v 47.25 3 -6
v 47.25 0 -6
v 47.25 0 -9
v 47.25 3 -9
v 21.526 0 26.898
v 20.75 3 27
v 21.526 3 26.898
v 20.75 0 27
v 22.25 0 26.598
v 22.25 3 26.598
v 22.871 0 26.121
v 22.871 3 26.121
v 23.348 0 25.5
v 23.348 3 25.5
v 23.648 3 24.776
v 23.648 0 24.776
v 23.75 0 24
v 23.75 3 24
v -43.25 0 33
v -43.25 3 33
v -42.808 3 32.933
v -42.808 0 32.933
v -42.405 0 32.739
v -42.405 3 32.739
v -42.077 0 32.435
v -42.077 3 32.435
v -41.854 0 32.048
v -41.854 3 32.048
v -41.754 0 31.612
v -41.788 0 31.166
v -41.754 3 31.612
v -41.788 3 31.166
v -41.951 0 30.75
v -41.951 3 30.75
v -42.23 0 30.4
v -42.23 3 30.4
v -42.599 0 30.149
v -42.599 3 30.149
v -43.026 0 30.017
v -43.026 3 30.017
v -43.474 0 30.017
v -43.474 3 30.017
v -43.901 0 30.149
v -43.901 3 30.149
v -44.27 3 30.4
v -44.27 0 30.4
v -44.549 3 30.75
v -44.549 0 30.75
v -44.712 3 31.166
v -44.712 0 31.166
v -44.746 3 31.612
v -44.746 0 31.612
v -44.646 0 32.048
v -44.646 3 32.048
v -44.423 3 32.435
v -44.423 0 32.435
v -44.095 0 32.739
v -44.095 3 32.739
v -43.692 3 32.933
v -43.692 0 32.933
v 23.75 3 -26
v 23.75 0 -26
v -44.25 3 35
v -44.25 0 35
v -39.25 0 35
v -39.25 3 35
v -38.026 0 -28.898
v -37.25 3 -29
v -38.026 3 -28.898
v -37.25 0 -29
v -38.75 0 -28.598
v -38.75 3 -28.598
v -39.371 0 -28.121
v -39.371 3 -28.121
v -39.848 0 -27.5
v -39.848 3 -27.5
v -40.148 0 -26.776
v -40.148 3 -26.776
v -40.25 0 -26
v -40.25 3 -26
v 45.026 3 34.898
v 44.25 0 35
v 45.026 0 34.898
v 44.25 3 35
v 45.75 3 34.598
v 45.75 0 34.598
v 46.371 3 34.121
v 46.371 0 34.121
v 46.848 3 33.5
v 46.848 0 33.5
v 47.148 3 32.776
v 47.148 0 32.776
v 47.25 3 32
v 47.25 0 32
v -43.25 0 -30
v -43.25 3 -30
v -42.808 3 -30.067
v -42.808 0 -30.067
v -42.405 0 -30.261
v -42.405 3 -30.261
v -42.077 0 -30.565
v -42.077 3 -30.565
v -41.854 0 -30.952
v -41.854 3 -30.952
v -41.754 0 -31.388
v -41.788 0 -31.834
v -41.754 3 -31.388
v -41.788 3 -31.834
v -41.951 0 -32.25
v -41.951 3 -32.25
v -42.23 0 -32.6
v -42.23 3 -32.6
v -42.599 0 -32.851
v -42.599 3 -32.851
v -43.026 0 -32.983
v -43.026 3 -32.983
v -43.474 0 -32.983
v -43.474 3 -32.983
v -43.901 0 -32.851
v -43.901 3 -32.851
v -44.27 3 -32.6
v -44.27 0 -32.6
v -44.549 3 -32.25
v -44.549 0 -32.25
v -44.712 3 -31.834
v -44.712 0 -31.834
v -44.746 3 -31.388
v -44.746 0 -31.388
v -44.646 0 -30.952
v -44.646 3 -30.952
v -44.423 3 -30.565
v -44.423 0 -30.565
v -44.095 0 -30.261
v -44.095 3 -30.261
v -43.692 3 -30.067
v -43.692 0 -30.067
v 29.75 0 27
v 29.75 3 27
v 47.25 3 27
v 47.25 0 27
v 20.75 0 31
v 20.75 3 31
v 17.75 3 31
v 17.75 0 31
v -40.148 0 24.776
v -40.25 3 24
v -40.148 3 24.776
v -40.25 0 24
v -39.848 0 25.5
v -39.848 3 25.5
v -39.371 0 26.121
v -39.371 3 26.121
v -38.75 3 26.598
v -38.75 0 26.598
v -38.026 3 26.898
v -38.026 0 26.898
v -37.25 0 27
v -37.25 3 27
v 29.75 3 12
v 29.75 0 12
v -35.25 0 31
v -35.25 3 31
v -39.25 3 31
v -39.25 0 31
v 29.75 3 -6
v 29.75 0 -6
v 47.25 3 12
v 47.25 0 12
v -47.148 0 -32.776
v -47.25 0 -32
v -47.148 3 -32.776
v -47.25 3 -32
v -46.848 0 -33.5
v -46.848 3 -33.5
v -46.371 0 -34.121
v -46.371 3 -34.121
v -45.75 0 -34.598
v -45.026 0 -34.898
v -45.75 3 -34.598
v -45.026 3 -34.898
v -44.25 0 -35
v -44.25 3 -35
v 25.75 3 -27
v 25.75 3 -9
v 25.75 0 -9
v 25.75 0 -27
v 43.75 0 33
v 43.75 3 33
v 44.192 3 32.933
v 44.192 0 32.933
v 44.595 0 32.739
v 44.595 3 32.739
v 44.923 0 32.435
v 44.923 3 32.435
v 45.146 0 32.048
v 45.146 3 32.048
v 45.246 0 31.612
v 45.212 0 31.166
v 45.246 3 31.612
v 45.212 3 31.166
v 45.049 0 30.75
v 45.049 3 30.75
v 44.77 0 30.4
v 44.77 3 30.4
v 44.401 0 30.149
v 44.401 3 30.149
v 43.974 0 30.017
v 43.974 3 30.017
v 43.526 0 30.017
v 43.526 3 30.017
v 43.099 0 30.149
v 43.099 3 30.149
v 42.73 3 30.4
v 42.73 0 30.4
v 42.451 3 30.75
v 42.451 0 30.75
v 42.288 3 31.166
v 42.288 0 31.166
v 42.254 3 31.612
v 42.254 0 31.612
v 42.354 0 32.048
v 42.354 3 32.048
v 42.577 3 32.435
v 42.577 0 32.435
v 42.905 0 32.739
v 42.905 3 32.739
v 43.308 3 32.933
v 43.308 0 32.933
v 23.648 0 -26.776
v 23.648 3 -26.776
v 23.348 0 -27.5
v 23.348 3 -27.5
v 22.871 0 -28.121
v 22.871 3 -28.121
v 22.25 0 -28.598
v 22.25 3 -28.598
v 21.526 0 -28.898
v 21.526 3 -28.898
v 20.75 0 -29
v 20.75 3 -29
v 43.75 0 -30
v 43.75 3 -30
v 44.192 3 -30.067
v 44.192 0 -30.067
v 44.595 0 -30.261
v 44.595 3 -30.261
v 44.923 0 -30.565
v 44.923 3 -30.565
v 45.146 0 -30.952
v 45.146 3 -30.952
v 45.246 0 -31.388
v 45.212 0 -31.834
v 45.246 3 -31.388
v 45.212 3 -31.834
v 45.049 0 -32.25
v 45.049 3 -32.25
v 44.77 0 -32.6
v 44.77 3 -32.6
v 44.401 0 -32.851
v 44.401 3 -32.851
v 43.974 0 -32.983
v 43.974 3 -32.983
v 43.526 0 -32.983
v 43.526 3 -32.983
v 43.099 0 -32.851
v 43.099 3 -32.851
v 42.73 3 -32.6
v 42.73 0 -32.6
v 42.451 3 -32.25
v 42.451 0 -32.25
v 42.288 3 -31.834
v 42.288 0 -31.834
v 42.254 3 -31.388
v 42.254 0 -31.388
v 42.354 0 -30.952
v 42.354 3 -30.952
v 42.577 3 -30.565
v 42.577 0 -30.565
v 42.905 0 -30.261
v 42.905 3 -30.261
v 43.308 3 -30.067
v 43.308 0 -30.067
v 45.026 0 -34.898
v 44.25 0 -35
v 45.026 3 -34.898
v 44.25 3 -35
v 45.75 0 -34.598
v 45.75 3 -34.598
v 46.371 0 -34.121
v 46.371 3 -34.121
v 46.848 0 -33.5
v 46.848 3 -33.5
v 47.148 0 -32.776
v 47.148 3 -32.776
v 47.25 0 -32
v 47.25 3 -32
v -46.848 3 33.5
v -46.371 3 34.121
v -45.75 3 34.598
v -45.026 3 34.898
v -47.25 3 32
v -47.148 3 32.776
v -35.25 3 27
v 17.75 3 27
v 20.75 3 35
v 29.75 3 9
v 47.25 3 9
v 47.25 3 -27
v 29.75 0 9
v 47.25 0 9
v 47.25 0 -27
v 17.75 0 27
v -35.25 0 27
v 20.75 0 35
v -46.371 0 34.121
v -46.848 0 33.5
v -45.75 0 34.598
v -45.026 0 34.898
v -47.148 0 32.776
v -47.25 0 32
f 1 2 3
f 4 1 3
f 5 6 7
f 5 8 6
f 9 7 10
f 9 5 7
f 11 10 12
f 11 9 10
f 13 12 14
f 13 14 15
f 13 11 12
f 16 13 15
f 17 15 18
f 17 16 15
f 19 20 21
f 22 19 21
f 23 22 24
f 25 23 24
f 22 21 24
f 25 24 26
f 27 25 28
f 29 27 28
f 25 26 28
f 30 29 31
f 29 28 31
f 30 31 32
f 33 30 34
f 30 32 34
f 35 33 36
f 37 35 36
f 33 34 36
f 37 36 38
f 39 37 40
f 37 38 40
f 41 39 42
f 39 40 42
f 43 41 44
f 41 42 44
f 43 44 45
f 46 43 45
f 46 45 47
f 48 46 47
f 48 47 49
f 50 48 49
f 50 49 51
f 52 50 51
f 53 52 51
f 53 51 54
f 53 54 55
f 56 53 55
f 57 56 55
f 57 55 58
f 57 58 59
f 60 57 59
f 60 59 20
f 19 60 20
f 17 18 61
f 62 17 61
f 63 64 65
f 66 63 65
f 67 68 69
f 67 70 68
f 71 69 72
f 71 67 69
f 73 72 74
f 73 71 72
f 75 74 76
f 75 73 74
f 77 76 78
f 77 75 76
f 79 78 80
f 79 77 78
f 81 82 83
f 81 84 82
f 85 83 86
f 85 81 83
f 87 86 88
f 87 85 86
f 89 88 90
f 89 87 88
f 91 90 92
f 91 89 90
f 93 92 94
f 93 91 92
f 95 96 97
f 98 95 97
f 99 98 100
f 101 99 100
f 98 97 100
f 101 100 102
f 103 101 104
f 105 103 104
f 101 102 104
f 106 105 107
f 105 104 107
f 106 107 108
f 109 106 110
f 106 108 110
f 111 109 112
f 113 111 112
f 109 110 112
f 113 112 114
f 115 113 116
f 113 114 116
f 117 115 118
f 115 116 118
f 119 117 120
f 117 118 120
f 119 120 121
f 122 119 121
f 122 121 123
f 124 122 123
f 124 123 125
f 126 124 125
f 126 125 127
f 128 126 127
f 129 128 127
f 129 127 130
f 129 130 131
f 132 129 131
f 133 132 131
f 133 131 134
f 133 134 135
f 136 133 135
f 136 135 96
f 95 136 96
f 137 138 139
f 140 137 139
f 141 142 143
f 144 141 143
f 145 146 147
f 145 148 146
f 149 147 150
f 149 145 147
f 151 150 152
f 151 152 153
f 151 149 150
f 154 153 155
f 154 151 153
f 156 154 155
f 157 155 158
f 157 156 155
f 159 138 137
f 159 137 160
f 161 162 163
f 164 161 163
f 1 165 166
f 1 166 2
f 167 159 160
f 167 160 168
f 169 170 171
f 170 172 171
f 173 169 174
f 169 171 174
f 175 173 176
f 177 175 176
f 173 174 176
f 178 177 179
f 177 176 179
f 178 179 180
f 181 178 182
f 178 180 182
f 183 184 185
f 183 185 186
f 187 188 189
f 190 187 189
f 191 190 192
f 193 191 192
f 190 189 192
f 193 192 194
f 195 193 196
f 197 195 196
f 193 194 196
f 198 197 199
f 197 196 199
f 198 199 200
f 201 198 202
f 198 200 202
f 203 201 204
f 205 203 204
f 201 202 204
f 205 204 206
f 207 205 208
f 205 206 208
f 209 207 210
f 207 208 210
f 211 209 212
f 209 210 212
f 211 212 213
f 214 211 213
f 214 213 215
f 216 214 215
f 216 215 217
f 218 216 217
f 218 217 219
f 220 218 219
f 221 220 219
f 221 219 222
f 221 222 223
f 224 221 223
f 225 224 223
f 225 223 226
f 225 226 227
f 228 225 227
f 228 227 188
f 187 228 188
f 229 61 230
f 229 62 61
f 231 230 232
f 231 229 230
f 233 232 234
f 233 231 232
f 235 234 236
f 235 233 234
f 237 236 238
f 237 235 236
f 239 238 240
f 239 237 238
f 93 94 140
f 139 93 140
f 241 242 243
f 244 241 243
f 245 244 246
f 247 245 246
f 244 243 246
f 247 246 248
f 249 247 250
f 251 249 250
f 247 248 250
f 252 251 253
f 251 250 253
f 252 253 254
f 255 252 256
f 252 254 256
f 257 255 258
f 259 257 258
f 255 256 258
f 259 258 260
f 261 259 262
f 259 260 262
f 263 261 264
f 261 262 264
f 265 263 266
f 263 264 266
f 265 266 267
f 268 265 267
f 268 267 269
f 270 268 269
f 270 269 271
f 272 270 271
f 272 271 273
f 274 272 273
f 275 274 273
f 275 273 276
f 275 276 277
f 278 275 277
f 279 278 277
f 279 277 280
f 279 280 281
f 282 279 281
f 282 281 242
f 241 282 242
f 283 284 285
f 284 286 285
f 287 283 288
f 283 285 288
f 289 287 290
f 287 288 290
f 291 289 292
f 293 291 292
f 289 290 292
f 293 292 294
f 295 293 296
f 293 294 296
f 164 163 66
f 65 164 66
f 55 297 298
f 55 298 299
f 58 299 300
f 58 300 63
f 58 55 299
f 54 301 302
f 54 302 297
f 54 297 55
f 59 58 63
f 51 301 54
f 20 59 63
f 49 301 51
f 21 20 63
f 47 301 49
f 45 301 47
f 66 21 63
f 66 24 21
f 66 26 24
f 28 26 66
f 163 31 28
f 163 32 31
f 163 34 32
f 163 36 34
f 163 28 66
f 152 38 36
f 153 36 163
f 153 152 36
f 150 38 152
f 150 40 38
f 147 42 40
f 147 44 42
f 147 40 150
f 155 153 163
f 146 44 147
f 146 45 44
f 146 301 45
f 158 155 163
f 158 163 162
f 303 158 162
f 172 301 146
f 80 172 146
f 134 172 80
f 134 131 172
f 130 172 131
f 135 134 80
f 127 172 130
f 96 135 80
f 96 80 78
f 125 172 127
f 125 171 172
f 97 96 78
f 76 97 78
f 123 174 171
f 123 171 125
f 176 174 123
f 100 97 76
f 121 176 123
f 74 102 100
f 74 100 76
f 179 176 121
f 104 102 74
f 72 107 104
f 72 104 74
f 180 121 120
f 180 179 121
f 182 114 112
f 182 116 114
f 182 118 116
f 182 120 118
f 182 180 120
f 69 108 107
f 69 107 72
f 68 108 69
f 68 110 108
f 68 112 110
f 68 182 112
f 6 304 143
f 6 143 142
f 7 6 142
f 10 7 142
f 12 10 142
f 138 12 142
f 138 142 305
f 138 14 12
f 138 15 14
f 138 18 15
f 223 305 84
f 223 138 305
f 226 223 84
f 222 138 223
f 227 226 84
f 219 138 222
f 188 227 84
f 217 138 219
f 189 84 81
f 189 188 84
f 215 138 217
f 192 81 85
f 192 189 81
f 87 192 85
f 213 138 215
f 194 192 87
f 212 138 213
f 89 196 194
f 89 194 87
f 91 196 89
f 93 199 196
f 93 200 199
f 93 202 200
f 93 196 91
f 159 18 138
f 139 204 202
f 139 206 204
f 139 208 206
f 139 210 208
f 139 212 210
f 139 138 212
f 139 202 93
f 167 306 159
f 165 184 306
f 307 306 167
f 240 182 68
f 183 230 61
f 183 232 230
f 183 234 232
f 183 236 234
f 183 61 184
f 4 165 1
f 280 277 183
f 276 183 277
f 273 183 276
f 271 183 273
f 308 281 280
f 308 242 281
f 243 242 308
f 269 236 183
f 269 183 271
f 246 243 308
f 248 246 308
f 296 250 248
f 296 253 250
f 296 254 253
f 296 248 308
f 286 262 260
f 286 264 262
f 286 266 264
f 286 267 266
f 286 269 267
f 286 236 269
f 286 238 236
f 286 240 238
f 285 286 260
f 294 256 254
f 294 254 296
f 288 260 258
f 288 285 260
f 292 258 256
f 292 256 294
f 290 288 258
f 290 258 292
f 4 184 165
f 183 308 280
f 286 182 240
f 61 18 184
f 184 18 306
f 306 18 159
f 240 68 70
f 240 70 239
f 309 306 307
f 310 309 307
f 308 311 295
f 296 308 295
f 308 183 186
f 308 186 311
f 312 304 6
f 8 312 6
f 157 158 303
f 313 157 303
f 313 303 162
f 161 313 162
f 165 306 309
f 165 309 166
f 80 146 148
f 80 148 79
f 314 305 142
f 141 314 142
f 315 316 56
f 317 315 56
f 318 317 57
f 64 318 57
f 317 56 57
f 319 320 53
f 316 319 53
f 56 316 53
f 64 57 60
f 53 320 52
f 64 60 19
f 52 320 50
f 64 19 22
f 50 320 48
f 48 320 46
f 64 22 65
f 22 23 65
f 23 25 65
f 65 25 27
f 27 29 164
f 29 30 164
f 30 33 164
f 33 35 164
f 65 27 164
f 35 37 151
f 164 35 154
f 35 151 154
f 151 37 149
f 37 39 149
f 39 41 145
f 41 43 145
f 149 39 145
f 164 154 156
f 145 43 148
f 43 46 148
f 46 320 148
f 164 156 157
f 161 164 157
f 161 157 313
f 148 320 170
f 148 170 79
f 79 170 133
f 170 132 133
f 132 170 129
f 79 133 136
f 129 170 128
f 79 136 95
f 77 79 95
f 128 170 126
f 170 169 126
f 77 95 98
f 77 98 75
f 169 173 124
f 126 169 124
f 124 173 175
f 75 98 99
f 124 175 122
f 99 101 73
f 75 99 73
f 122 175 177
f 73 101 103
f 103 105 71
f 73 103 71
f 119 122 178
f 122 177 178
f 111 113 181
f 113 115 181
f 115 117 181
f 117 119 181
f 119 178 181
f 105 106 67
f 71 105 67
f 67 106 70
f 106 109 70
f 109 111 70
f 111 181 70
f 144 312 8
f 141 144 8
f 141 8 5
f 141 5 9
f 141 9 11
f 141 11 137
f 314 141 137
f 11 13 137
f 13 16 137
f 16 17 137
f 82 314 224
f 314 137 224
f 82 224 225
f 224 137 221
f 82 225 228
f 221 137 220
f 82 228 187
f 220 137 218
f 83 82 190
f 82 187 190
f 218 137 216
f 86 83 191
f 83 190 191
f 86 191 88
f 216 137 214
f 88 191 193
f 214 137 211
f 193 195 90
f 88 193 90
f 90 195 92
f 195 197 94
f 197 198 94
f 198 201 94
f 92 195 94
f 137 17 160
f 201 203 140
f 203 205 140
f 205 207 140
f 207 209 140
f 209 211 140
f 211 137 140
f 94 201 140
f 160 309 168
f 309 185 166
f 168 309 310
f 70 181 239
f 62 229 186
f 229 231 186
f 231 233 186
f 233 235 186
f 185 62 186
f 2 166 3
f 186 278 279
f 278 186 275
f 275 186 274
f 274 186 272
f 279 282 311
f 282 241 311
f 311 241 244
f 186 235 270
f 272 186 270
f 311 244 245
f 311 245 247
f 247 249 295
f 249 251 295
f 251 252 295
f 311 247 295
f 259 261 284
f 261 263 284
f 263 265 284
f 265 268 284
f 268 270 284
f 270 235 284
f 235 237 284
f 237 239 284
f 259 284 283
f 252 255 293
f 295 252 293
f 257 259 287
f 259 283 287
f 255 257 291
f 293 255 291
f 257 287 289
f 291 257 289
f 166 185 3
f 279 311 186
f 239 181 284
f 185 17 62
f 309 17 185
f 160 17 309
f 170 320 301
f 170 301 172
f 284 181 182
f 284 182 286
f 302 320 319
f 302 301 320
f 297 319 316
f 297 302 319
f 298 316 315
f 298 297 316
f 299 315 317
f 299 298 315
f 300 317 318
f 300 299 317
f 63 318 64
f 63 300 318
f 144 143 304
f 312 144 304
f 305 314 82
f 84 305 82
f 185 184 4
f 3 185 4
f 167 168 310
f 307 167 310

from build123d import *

# Parameters (mm, degrees)
SKETCH1_W           = 94.5
SKETCH1_H           = 70
BOSS_EXTRUDE1_DEPTH = 3
SKETCH3_R           = 1.5
CUT_EXTRUDE2_DEPTH  = 59.877521177
FILLET2_R           = 3
SKETCH5_W           = 64
SKETCH5_H           = 56
SKETCH5_W_2         = 21.5
SKETCH5_H_2         = 18
SKETCH5_W_3         = 17.5
SKETCH5_H_3         = 15
CUT_EXTRUDE3_DEPTH  = 59.877521177
FILLET3_R           = 3


with BuildPart() as part:
    # Sketch1 → Boss-Extrude1 (new body)
    with BuildSketch(Plane(origin=(0, 0, 0), x_dir=(1, 0, 0), z_dir=(0, 1, 0))):
        Rectangle(SKETCH1_W, SKETCH1_H)
    extrude(amount=BOSS_EXTRUDE1_DEPTH)

    # Sketch3 → Cut-Extrude2 (cut, through all)
    with BuildSketch(Plane(origin=(0, 3, 0), x_dir=(1, 0, 0), z_dir=(0, 1, 0))):
        with Locations(Location((43.75, 31.5, 0), (0, 0, 270))):
            Circle(SKETCH3_R)
        with Locations(Location((-43.25, 31.5, 0), (0, 0, 270))):
            Circle(SKETCH3_R)
        with Locations(Location((-43.25, -31.5, 0), (0, 0, 270))):
            Circle(SKETCH3_R)
        with Locations(Location((43.75, -31.5, 0), (0, 0, 270))):
            Circle(SKETCH3_R)
    extrude(amount=-CUT_EXTRUDE2_DEPTH, mode=Mode.SUBTRACT)

    # Fillet2
    fillet2_edges = [part.edges().sort_by_distance(p)[0] for p in [
        (47.25, 1.5, 35),
        (-47.25, 1.5, 35),
        (-47.25, 1.5, -35),
        (47.25, 1.5, -35),
    ]]
    fillet(fillet2_edges, radius=FILLET2_R)

    # Sketch5 → Cut-Extrude3 (cut, through all)
    with BuildSketch(Plane(origin=(0, 3, 0), x_dir=(1, 0, 0), z_dir=(0, 1, 0))):
        with Locations((-8.25, 1)):
            Rectangle(SKETCH5_W, SKETCH5_H)
        with Locations((36.5, 18)):
            Rectangle(SKETCH5_W_2, SKETCH5_H_2)
        with Locations((38.5, -1.5)):
            Rectangle(SKETCH5_W_3, SKETCH5_H_3)
        with Locations((38.5, -19.5)):
            Rectangle(SKETCH5_W_3, SKETCH5_H_3)
        Polygon((17.75, -27), (-35.25, -27), (-35.25, -31), (-39.25, -31), (-39.25, -35), (20.75, -35), (20.75, -31), (17.75, -31), align=None)
    extrude(amount=-CUT_EXTRUDE3_DEPTH, mode=Mode.SUBTRACT)

    # Fillet3
    fillet3_edges = [part.edges().sort_by_distance(p)[0] for p in [
        (-40.25, 1.5, 27),
        (-40.25, 1.5, -29),
        (23.75, 1.5, -29),
        (23.75, 1.5, 27),
    ]]
    fillet(fillet3_edges, radius=FILLET3_R)


solid = part.part
